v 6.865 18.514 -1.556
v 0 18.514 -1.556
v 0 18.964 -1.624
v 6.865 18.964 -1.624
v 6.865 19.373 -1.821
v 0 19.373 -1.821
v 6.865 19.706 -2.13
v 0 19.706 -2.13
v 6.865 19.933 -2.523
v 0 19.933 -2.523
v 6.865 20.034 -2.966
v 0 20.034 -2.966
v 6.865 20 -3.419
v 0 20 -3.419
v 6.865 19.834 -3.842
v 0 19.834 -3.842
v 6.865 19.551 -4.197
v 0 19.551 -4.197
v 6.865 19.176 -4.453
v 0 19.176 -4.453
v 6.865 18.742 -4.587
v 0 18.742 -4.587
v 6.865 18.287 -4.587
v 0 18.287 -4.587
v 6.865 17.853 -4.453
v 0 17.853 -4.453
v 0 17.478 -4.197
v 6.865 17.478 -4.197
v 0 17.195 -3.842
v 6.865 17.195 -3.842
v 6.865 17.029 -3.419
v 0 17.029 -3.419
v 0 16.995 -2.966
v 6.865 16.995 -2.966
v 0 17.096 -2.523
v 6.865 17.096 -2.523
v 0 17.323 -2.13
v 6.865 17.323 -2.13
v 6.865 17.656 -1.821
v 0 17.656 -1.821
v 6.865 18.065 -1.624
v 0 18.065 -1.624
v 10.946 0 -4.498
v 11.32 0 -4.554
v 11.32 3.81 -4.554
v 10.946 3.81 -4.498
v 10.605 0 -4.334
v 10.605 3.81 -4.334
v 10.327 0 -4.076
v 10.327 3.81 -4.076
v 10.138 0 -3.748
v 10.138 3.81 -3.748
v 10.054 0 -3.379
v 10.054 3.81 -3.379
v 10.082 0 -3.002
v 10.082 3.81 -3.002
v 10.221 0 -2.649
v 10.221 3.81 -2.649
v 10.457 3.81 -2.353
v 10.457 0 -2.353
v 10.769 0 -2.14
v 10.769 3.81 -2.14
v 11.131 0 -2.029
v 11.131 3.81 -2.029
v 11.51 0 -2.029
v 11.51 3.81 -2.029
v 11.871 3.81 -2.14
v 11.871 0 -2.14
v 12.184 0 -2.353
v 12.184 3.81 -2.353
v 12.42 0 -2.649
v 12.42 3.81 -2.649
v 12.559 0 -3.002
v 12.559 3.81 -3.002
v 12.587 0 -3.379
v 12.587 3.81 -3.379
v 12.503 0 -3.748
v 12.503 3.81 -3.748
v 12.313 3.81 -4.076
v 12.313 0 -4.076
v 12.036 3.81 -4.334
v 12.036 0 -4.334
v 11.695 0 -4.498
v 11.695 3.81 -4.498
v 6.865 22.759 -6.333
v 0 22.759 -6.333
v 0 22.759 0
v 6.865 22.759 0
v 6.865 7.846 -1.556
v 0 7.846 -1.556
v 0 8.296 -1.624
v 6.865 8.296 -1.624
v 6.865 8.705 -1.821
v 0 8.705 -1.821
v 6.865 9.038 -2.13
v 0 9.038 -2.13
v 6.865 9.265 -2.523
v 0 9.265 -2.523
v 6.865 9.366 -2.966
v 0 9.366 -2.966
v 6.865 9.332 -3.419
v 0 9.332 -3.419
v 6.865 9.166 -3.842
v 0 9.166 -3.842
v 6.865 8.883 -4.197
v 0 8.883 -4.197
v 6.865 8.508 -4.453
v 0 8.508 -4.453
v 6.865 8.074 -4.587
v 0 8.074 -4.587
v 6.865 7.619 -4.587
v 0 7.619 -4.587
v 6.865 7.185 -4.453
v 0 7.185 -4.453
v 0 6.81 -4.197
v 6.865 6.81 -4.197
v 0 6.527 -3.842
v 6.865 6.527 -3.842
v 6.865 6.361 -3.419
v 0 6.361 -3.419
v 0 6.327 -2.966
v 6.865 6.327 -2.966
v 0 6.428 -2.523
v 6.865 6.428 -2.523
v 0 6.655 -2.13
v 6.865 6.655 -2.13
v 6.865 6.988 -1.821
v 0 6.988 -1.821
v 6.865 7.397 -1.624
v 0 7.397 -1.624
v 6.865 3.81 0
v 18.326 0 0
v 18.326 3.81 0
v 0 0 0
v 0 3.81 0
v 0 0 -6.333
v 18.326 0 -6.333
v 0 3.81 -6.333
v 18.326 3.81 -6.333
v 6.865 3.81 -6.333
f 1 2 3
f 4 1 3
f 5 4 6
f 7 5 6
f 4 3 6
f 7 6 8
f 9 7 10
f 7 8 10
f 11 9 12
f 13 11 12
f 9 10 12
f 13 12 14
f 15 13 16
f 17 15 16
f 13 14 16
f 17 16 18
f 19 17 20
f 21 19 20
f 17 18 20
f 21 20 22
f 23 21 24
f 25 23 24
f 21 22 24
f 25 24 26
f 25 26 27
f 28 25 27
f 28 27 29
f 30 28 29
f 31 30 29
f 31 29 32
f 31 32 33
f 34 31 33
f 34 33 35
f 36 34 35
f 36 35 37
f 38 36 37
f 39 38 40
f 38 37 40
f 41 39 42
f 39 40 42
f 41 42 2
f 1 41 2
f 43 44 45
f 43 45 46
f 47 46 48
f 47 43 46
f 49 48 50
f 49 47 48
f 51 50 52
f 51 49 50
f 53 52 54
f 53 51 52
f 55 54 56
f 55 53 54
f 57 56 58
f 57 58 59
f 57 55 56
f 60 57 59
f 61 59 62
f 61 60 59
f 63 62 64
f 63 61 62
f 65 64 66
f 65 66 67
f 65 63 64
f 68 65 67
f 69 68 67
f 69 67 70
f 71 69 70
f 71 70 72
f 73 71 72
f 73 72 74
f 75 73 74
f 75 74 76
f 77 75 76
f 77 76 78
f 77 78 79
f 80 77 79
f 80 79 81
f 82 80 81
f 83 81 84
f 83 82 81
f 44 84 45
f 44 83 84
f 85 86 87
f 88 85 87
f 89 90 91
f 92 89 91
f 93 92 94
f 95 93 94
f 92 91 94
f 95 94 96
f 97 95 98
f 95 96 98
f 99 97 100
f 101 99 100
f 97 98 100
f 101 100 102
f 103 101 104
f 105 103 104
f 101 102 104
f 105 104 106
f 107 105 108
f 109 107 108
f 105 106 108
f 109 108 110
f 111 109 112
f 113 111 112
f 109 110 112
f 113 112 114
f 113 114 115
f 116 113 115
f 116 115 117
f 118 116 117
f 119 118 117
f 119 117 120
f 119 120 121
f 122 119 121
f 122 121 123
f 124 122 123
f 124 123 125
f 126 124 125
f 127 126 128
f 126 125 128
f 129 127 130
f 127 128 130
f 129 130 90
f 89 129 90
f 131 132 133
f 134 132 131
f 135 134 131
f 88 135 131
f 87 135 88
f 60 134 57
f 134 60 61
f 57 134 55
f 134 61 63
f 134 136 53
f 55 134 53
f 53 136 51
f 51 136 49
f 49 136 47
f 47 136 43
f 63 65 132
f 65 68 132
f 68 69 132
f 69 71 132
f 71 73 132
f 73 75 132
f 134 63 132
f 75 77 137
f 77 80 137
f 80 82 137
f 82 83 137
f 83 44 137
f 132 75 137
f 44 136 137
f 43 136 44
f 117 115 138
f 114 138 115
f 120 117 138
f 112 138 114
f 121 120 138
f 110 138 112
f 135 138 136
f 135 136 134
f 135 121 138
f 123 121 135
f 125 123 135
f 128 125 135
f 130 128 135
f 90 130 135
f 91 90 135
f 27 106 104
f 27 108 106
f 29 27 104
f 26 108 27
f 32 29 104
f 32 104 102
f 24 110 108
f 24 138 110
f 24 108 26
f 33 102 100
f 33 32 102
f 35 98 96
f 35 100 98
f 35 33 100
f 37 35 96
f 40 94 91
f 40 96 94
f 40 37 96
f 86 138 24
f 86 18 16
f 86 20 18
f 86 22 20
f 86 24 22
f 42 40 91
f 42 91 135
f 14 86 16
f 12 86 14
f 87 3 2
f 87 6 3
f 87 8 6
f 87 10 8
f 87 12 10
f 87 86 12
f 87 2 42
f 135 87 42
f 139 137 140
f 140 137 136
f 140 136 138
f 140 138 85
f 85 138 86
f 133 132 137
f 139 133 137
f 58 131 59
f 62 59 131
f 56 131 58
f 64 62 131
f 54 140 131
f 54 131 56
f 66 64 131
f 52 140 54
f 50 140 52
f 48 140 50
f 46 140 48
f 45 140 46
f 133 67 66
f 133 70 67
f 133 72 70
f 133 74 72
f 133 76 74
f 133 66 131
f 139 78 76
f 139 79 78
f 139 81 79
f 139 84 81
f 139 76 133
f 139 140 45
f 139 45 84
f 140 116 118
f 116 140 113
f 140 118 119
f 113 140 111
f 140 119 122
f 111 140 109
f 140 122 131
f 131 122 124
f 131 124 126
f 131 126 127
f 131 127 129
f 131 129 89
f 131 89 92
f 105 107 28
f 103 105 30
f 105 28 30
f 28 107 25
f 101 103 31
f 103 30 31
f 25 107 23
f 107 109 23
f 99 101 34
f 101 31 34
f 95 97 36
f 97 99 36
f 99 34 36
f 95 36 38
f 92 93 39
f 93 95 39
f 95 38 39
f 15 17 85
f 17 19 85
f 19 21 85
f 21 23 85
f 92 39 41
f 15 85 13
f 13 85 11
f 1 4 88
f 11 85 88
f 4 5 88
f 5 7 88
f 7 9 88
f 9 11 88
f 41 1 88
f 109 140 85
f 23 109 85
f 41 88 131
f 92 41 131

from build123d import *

# Parameters (mm, degrees)
SKETCH1_W           = 18.325664351
SKETCH1_H           = 6.332689346
SKETCH1_R           = 1.27
BOSS_EXTRUDE1_DEPTH = 3.81
SKETCH2_W           = 6.332689346
SKETCH2_H           = 18.949374656
SKETCH2_R           = 1.524
BOSS_EXTRUDE2_DEPTH = 6.864742327


with BuildPart() as part:
    # Sketch1 → Boss-Extrude1 (new body)
    with BuildSketch(Plane(origin=(0, 0, 0), x_dir=(1, 0, 0), z_dir=(0, 1, 0))):
        with Locations((9.162832176, 3.166344673)):
            Rectangle(SKETCH1_W, SKETCH1_H)
        with Locations(Location((11.320424566, 3.284411685, 0), (0, 0, 90))):
            Circle(SKETCH1_R, mode=Mode.SUBTRACT)
    extrude(amount=BOSS_EXTRUDE1_DEPTH)

    # Sketch2 → Boss-Extrude2 (add)
    with BuildSketch(Plane.ZY):
        with Locations((-3.166344673, 13.284687328)):
            Rectangle(SKETCH2_W, SKETCH2_H)
        with Locations((-3.080246652, 18.514377614)):
            Circle(SKETCH2_R, mode=Mode.SUBTRACT)
        with Locations((-3.080246652, 7.846377614)):
            Circle(SKETCH2_R, mode=Mode.SUBTRACT)
    extrude(amount=-BOSS_EXTRUDE2_DEPTH)


solid = part.part
